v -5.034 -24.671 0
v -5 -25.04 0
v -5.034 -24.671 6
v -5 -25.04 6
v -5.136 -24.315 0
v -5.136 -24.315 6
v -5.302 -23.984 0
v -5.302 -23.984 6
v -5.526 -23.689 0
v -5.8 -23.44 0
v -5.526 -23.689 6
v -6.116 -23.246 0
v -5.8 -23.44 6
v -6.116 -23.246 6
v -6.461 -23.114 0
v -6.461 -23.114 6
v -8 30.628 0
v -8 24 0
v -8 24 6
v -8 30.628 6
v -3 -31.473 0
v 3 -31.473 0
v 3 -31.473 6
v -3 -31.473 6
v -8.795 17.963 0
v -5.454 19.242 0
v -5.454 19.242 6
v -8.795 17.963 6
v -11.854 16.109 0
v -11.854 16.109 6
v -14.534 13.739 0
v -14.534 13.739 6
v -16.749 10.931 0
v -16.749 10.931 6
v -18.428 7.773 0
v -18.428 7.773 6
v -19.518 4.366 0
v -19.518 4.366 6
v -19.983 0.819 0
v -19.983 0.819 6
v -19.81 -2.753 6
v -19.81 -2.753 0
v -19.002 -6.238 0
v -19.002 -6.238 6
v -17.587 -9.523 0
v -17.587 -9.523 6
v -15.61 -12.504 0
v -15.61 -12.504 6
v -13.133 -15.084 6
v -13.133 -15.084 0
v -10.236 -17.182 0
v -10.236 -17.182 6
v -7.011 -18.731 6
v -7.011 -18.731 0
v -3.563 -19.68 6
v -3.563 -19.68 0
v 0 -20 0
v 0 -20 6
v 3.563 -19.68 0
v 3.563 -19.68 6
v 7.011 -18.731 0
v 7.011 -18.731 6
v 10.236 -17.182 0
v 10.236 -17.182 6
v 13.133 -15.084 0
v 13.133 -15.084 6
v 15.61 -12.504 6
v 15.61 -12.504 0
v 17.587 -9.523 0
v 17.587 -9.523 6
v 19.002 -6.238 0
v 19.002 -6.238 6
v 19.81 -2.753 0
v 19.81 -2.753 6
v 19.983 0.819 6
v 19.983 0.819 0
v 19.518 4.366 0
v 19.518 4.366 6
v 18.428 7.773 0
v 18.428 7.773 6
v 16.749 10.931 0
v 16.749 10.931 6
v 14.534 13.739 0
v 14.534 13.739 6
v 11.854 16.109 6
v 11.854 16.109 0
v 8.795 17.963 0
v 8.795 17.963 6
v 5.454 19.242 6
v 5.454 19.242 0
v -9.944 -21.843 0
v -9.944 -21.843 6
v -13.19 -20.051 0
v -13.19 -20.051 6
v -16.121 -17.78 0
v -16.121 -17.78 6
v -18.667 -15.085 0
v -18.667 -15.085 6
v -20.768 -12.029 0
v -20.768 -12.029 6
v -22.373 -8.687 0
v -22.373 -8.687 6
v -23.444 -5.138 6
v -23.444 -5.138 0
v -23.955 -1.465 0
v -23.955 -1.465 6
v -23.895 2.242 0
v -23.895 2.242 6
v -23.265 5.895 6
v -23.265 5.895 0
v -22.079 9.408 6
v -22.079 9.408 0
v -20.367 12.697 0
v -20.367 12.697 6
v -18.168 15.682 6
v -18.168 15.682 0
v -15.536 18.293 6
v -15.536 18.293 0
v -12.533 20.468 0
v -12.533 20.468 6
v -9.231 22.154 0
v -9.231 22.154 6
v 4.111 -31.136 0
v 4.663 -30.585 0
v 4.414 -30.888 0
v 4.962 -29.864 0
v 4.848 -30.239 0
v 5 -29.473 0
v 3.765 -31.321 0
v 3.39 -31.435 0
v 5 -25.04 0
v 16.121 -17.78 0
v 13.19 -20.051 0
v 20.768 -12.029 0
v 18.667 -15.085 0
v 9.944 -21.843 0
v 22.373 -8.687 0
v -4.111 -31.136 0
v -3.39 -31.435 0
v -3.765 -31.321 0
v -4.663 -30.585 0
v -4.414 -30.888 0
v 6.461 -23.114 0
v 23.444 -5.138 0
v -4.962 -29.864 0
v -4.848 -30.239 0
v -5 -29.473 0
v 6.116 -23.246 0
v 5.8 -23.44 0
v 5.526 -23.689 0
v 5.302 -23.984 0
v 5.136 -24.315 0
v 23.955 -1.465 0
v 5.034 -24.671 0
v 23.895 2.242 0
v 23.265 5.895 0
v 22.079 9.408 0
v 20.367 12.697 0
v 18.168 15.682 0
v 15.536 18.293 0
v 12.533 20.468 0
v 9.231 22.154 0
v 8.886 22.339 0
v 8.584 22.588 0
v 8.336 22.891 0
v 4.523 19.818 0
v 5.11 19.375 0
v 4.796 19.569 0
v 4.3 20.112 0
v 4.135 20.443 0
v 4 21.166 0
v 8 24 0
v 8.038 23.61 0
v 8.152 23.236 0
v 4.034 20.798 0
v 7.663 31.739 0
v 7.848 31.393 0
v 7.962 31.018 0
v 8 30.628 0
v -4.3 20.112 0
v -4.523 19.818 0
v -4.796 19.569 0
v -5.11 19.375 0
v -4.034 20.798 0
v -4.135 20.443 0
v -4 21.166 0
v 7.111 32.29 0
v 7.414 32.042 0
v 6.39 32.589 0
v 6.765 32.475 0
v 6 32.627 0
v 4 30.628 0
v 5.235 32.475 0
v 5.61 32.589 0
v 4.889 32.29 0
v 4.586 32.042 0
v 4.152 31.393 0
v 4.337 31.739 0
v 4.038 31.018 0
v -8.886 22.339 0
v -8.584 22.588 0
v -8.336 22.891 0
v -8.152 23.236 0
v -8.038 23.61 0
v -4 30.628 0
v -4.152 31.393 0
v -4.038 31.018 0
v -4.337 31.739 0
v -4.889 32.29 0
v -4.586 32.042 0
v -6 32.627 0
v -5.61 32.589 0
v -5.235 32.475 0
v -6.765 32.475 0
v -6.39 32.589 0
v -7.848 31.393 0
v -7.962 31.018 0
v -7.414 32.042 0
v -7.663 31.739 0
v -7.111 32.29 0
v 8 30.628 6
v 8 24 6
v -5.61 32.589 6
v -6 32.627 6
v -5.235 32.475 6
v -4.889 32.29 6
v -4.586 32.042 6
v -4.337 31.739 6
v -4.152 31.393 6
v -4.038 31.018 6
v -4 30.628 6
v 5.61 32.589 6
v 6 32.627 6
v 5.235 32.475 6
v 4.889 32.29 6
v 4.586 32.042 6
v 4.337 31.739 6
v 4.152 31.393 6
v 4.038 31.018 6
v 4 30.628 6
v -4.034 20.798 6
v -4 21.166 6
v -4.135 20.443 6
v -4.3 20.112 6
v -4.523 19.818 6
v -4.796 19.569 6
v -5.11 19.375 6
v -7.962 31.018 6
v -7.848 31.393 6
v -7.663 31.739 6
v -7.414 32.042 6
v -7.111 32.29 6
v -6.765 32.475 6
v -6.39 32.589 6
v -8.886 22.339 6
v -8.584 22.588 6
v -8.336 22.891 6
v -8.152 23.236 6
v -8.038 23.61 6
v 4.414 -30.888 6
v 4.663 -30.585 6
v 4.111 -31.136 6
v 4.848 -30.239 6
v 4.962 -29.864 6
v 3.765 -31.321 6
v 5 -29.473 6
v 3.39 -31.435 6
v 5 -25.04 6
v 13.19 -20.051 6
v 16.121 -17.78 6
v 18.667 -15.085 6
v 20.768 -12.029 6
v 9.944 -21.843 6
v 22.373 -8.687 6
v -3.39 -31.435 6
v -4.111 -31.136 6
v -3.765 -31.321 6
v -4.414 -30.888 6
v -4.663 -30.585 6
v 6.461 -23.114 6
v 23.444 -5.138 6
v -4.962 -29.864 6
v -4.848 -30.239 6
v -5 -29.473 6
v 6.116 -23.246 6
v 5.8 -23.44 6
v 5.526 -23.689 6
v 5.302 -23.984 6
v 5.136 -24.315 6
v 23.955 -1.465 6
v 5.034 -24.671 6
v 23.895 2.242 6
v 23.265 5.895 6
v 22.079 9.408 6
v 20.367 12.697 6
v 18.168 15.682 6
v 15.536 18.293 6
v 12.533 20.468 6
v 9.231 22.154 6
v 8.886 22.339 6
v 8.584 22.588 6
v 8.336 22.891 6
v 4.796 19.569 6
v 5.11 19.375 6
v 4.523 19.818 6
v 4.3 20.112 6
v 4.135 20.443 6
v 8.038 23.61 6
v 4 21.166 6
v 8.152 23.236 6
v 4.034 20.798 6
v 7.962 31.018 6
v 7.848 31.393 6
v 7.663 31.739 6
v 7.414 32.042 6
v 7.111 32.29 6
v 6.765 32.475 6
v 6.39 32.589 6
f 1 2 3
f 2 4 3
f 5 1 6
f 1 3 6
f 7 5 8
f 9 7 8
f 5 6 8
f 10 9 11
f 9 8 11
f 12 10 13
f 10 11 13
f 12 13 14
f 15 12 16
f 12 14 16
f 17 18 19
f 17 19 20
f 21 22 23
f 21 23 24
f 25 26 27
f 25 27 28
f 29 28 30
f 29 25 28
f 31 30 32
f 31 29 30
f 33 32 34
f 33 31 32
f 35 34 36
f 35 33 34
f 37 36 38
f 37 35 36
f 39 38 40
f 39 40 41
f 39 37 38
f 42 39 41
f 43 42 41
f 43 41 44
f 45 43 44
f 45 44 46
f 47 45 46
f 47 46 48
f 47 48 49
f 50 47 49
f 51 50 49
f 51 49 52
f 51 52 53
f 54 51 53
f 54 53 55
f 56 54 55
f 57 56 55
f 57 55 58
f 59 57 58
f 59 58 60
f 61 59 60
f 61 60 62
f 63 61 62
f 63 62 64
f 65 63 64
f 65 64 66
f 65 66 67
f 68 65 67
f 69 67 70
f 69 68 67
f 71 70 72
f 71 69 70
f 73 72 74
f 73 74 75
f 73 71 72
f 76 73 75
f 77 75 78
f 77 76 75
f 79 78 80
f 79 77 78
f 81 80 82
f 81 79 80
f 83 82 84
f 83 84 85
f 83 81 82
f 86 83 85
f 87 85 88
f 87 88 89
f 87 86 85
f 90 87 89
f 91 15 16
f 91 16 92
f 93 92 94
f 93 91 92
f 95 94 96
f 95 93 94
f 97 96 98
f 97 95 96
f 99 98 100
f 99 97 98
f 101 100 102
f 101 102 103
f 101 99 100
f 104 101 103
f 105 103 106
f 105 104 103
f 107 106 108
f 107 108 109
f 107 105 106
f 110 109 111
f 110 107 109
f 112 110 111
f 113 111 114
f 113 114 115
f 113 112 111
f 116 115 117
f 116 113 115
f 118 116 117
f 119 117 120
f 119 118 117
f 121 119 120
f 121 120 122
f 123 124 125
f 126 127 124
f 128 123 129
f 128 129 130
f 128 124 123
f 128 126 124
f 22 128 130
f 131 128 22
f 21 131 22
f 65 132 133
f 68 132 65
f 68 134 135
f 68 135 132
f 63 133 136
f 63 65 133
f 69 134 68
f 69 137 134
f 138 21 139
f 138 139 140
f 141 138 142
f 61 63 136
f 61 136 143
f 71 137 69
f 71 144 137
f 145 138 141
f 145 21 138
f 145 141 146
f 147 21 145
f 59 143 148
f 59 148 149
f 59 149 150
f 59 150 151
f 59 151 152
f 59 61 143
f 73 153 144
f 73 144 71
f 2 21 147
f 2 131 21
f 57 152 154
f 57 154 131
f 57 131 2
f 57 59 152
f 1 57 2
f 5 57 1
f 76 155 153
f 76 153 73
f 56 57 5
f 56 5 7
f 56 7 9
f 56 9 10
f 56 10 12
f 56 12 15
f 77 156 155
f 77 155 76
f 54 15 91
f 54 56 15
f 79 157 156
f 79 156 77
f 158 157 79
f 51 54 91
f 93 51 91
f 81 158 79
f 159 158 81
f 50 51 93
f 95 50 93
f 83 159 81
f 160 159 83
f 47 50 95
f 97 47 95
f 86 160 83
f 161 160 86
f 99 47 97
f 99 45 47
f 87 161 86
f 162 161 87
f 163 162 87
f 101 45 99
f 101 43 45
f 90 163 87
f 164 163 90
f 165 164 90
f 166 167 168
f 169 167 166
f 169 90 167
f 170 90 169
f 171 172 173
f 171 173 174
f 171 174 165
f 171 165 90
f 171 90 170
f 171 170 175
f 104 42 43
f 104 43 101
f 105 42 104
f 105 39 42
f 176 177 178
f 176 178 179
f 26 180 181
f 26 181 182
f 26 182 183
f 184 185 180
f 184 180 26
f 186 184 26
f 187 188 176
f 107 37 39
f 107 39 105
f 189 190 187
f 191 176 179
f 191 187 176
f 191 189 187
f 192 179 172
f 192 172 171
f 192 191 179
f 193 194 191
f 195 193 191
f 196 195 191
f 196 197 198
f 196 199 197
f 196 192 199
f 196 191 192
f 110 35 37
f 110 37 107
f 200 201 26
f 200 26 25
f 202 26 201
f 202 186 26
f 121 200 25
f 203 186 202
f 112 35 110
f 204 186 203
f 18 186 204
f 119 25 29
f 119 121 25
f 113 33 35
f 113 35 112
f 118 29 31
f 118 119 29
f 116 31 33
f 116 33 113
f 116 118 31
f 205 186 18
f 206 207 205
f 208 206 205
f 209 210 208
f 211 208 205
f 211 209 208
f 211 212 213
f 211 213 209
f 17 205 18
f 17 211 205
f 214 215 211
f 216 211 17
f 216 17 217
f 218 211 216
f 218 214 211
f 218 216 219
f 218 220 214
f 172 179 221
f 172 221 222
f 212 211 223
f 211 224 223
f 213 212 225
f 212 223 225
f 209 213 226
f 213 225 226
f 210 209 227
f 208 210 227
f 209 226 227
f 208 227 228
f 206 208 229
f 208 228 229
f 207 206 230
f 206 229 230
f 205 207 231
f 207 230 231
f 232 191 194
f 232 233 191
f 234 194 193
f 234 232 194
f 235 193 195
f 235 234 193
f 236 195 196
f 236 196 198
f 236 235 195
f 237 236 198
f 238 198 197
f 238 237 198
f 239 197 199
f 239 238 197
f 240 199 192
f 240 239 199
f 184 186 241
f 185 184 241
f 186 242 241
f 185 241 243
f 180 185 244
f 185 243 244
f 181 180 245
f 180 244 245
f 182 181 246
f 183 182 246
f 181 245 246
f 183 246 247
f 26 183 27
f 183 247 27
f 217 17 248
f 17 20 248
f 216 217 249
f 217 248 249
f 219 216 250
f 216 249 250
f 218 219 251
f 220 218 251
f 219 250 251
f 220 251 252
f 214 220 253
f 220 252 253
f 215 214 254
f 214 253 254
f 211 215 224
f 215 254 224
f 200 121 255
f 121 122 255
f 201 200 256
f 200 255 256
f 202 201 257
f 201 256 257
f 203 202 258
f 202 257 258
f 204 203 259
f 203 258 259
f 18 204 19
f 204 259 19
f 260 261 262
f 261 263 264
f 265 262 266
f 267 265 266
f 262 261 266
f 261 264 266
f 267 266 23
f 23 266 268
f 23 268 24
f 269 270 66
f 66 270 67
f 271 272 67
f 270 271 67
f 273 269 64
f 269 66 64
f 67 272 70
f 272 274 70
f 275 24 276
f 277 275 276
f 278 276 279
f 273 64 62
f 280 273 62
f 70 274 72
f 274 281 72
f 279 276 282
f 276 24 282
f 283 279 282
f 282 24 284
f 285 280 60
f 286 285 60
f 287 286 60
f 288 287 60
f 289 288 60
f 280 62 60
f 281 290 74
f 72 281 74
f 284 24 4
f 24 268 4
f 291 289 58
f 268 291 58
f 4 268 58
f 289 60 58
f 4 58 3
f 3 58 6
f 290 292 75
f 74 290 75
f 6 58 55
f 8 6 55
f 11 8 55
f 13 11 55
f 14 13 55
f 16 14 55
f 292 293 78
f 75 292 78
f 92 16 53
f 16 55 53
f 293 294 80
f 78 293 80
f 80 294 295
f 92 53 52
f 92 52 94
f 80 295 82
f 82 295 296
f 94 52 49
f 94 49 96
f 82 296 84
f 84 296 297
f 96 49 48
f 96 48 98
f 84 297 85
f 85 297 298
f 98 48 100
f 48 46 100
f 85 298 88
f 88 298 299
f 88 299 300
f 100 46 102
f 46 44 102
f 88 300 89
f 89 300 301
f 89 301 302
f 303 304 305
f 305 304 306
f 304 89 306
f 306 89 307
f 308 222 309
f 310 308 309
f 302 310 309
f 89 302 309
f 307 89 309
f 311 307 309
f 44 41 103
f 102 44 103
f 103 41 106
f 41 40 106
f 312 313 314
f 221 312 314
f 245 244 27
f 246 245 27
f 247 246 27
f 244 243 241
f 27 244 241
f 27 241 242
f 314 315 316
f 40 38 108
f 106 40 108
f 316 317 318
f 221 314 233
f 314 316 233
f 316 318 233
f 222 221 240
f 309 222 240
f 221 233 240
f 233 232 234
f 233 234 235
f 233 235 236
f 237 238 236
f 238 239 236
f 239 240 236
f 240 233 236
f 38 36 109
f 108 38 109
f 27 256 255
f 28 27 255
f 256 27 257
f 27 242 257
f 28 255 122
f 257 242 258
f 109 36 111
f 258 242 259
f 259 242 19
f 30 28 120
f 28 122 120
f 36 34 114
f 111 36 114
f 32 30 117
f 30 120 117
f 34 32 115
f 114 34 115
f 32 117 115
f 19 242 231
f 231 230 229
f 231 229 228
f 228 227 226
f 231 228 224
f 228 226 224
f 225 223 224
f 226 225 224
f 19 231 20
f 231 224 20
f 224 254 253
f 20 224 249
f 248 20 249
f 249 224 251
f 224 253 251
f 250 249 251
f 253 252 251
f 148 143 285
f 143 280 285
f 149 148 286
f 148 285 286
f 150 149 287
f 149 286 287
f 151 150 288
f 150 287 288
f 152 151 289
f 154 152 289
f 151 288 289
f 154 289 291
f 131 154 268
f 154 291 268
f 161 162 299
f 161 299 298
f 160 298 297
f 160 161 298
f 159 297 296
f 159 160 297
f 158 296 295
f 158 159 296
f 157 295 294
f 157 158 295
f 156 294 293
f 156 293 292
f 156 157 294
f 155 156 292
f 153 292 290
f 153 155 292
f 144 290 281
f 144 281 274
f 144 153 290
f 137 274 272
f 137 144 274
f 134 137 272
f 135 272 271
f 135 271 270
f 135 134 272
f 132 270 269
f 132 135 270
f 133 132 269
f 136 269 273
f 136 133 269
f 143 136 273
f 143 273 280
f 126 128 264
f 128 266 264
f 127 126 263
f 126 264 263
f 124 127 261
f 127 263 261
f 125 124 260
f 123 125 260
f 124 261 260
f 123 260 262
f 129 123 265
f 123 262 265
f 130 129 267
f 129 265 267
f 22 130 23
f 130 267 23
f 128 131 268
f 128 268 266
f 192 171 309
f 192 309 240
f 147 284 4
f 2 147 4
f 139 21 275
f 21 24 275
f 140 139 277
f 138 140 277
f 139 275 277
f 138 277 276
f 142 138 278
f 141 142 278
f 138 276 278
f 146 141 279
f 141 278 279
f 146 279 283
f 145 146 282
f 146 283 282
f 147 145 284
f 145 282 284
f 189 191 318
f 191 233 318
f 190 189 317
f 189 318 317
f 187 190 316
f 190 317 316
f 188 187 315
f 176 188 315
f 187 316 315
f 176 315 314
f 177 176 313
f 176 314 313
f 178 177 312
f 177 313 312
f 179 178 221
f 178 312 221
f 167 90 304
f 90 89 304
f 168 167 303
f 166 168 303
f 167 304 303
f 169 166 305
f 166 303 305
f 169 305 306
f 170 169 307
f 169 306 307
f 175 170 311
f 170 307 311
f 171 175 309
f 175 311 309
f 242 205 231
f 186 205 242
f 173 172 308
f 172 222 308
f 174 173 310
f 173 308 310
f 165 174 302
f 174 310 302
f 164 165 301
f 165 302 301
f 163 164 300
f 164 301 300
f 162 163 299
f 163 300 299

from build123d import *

# Parameters (mm, degrees)
BOSS_EXTRUDE1_DEPTH = 6
FILLET1_R           = 2


with BuildPart() as part:
    # Sketch1 → Boss-Extrude1 (new body)
    with BuildSketch(Plane.XY):
        with BuildLine():
            Line((4, 32.627416998), (8, 32.627416998))
            Line((8, 32.627416998), (8, 22.627416998))
            ThreePointArc((8, 22.627416998), (23.949344099, -1.558498392), (5, -23.473389189))
            Line((5, -23.473389189), (5, -31.473389189))
            Line((5, -31.473389189), (-5, -31.473389189))
            Line((-5, -31.473389189), (-5, -23.473389189))
            ThreePointArc((-5, -23.473389189), (-23.949344099, -1.558498392), (-8, 22.627416998))
            Line((-8, 22.627416998), (-8, 32.627416998))
            Line((-8, 32.627416998), (-4, 32.627416998))
            Line((-4, 32.627416998), (-4, 19.595917942))
            ThreePointArc((-4, 19.595917942), (0, -20), (4, 19.595917942))
            Line((4, 19.595917942), (4, 32.627416998))
        make_face()
    extrude(amount=BOSS_EXTRUDE1_DEPTH)

    # Fillet1
    fillet1_edges = [part.edges().sort_by_distance(p)[0] for p in [
        (-4, 19.595917942, 3),
        (4, 19.595917942, 3),
        (-8, 22.627416998, 3),
        (8, 32.627416998, 3),
        (4, 32.627416998, 3),
        (-4, 32.627416998, 3),
        (-8, 32.627416998, 3),
        (-5, -31.473389189, 3),
        (-5, -23.473389189, 3),
        (5, -31.473389189, 3),
        (5, -23.473389189, 3),
        (8, 22.627416998, 3),
    ]]
    fillet(fillet1_edges, radius=FILLET1_R - 0.0001)  # a hair under: the kernel refuses the full size


solid = part.part
